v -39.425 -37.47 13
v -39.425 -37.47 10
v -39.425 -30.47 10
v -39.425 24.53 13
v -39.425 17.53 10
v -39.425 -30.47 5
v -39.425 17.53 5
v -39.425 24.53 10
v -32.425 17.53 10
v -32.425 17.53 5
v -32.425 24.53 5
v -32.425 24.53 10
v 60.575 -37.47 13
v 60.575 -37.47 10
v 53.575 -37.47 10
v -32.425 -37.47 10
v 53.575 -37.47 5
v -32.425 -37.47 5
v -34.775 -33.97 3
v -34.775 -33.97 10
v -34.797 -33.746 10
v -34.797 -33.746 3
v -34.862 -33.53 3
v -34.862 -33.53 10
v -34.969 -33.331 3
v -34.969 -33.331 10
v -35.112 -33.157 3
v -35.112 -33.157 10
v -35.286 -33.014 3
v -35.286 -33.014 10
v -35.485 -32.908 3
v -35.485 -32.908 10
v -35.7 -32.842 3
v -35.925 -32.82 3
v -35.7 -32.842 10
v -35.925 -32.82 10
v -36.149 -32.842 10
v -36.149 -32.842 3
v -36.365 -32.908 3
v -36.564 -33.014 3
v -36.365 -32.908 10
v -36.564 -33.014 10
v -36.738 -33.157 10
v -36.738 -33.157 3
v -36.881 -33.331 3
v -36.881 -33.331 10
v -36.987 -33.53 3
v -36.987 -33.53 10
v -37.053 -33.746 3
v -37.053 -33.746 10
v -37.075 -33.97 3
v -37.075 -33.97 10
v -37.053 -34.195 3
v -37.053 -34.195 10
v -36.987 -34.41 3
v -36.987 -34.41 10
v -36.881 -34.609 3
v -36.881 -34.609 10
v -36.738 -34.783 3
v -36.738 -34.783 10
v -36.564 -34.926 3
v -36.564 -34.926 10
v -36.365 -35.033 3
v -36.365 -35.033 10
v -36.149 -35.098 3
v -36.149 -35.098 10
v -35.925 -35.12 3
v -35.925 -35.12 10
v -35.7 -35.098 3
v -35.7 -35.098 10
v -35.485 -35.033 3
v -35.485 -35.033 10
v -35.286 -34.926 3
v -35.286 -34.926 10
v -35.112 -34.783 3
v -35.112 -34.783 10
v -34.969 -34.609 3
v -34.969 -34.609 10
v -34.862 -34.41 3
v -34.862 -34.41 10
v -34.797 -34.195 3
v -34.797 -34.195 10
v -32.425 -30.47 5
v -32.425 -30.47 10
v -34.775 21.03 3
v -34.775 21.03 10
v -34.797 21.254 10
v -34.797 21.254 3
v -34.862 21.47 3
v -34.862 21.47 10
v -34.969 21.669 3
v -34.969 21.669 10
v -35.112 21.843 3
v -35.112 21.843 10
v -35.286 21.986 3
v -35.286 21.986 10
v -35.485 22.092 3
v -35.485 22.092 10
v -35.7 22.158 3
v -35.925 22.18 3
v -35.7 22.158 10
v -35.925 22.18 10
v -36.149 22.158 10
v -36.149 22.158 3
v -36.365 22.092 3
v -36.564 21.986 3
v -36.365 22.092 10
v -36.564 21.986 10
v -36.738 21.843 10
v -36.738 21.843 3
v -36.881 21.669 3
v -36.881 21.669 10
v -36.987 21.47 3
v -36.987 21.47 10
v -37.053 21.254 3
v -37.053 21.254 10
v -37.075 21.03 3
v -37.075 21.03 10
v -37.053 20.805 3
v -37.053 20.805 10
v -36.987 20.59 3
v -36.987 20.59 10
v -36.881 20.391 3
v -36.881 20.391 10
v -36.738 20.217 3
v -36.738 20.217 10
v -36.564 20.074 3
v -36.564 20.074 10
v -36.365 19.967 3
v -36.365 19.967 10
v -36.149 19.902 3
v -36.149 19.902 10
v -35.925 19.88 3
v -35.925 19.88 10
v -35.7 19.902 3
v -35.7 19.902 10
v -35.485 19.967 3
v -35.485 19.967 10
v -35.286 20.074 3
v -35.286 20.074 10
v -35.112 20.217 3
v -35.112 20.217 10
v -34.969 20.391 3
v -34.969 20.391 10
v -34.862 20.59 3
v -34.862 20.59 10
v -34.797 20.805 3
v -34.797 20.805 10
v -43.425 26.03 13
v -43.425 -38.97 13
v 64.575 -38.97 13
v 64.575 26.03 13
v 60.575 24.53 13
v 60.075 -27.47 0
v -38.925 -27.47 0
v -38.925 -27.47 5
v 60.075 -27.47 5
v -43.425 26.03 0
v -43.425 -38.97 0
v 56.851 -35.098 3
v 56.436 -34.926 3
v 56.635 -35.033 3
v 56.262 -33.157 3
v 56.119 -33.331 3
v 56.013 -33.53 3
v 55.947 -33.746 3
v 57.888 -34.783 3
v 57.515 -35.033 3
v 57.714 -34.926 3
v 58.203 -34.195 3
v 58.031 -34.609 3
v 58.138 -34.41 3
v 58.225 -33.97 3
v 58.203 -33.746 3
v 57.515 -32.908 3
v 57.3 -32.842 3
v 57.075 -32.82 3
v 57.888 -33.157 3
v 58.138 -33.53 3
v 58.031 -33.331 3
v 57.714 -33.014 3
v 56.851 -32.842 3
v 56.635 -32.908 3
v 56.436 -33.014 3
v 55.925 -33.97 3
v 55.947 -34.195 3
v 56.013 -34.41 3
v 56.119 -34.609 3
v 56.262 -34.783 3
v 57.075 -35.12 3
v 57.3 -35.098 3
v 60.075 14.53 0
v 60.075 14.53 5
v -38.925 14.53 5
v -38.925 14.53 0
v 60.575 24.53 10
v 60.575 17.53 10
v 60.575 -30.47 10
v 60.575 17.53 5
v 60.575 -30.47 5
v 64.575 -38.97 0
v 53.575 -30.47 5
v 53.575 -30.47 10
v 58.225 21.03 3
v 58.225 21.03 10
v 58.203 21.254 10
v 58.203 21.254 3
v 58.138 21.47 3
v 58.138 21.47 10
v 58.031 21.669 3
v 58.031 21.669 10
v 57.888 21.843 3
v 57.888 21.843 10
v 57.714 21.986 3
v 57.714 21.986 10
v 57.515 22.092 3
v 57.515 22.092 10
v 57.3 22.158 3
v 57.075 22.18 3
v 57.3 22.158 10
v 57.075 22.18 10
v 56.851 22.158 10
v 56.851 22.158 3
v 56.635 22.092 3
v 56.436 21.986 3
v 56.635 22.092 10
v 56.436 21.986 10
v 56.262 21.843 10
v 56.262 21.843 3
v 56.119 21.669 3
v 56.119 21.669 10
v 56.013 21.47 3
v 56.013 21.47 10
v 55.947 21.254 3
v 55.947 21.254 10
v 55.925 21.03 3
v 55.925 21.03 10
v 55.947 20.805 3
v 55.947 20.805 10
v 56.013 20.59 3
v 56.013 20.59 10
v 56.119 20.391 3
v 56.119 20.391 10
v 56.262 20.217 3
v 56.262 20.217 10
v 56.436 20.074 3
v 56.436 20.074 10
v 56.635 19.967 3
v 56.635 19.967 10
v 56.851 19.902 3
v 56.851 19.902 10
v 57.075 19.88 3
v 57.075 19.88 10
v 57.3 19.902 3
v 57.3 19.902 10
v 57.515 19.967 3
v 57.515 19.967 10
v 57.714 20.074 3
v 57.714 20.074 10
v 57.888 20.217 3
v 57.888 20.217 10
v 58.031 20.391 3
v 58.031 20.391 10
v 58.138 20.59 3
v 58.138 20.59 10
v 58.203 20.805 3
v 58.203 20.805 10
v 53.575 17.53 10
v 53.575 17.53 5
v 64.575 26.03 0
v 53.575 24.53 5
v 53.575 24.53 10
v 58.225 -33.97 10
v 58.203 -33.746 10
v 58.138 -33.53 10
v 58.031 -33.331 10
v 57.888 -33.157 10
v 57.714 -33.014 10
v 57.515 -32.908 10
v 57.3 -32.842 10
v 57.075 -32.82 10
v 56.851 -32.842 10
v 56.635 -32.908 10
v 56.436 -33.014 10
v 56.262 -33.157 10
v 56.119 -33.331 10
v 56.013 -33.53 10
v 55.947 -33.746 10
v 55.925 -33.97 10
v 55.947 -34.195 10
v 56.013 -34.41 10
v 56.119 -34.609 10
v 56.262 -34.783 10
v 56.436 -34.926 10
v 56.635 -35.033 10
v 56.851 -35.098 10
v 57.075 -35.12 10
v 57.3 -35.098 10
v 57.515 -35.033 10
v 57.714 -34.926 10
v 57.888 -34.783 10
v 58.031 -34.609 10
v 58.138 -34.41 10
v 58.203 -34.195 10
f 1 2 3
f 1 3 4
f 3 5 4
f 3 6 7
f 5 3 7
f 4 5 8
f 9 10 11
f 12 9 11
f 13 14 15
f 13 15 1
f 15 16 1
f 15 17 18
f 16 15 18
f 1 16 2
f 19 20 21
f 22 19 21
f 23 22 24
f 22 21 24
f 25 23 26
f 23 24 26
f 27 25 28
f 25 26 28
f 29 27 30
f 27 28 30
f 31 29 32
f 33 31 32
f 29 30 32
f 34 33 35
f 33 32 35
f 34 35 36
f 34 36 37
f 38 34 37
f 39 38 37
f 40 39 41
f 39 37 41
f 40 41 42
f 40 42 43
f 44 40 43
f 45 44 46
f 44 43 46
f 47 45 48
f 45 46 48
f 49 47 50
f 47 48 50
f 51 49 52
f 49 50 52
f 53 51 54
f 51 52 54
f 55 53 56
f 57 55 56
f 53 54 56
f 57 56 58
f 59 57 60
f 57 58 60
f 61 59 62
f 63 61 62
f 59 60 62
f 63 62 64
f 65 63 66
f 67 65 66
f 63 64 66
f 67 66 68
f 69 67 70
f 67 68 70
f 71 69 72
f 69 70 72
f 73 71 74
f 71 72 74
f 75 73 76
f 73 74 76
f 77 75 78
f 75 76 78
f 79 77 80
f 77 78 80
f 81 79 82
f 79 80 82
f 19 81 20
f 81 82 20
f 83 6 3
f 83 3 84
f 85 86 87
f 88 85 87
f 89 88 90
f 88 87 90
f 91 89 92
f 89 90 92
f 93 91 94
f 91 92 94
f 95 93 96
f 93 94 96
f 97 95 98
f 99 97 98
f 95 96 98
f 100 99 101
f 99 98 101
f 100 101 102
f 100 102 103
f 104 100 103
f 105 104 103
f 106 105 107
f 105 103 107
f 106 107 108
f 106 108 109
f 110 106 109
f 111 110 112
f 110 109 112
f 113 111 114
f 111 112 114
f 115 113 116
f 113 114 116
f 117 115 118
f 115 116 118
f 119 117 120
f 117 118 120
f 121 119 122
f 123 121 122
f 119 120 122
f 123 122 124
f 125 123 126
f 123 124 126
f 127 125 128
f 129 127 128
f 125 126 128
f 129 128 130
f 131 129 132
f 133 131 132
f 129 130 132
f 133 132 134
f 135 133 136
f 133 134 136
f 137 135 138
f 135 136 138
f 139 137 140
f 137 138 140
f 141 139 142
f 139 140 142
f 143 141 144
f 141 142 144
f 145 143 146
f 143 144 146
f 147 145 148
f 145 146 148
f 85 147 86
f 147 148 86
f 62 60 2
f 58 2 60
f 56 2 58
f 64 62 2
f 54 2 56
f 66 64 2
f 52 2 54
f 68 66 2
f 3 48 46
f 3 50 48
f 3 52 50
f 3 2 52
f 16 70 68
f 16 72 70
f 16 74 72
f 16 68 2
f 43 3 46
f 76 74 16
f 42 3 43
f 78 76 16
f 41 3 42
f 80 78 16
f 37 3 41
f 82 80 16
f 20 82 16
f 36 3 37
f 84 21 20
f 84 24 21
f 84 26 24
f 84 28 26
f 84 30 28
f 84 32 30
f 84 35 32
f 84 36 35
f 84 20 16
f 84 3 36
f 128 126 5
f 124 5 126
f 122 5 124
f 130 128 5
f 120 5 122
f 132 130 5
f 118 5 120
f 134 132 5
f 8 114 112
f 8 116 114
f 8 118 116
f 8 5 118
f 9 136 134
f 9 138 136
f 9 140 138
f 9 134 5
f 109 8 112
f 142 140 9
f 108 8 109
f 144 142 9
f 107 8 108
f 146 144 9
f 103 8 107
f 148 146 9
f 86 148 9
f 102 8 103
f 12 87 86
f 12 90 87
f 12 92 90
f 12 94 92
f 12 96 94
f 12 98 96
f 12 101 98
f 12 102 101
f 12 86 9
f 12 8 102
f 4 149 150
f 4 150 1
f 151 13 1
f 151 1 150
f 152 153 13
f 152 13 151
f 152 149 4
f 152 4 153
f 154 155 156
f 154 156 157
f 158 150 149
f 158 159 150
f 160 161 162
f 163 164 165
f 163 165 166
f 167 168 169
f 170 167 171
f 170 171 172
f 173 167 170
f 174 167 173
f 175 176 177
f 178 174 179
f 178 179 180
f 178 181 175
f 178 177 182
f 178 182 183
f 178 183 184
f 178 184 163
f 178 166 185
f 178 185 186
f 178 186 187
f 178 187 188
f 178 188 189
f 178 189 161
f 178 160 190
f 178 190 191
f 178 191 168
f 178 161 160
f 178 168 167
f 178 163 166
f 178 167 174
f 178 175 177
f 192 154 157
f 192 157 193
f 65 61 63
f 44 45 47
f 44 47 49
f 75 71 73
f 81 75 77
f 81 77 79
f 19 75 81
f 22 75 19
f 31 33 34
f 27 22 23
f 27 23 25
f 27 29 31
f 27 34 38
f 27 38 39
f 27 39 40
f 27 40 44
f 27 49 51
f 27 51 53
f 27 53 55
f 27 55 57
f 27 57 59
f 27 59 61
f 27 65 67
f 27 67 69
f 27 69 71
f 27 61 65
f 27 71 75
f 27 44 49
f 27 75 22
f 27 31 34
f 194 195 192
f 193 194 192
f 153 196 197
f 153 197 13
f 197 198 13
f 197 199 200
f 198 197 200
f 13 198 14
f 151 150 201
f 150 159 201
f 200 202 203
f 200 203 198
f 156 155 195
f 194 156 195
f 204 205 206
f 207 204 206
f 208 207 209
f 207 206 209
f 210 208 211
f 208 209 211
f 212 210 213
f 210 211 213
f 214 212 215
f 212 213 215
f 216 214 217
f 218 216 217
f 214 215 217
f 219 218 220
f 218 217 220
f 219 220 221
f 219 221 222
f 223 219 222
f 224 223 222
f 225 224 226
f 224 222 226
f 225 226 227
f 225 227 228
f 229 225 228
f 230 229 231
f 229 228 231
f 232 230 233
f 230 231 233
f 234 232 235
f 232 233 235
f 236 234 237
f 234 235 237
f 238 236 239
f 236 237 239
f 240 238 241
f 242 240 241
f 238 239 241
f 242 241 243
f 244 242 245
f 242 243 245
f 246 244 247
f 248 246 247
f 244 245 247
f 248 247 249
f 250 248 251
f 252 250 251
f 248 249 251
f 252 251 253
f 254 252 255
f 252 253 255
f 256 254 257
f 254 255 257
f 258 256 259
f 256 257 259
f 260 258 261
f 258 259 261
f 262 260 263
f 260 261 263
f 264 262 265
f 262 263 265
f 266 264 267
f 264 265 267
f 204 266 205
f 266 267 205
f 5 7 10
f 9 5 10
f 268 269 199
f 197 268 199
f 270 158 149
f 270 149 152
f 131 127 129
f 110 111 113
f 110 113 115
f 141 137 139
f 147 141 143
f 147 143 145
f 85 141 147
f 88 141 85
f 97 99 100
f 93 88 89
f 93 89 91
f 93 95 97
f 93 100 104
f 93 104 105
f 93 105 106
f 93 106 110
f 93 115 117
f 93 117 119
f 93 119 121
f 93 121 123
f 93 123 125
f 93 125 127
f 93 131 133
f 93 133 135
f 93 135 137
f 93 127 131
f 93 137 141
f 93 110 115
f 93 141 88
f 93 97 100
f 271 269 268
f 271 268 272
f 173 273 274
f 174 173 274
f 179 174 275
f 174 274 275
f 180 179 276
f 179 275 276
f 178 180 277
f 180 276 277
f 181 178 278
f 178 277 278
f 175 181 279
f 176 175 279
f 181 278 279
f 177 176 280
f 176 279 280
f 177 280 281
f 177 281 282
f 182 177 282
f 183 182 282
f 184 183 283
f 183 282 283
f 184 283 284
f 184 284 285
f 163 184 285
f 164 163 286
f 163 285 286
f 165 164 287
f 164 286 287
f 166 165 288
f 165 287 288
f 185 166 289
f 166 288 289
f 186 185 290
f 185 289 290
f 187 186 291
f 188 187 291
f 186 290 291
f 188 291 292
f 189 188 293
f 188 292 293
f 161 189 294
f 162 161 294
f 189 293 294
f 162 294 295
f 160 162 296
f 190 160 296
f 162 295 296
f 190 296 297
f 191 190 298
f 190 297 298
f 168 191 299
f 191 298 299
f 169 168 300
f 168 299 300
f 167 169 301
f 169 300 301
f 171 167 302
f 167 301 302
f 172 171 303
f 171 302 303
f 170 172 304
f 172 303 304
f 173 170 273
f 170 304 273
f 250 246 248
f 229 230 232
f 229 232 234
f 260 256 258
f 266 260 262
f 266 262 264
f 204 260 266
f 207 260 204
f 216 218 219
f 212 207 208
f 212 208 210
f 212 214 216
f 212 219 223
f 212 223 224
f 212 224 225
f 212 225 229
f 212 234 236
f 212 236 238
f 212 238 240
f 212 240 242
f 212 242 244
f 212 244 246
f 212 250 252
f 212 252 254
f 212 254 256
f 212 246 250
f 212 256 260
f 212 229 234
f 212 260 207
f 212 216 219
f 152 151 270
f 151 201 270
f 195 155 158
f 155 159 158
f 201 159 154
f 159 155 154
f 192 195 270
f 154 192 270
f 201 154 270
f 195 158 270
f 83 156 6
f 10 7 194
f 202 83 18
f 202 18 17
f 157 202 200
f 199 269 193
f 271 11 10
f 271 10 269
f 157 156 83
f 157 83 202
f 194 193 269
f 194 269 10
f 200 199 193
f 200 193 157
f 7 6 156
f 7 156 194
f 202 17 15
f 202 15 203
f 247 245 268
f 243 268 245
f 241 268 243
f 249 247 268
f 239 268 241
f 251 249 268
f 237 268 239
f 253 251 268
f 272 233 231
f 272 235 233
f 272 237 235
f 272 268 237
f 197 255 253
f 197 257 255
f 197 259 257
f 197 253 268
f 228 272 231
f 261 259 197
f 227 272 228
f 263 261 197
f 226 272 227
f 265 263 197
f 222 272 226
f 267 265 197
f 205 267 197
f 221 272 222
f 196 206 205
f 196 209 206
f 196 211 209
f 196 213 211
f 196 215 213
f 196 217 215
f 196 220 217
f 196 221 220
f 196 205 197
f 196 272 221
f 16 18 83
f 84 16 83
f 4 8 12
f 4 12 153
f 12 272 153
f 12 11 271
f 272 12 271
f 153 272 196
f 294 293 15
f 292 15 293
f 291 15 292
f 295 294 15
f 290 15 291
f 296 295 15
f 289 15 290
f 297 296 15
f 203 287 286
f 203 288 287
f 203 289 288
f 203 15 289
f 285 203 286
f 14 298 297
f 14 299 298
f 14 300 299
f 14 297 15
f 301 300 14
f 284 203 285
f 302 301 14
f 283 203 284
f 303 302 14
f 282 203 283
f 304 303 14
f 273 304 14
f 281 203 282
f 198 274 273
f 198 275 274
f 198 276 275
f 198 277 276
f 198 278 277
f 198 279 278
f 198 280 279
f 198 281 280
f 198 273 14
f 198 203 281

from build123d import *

# Parameters (mm, degrees)
SKETCH_1_W          = 108
SKETCH_1_H          = 65
SKETCH_1_W_2        = 99
SKETCH_1_H_2        = 42
EXTRUDE_1_DEPTH     = 5
SKETCH_2_W          = 108
SKETCH_2_H          = 65
SKETCH_2_W_2        = 100
SKETCH_2_H_2        = 62
SKETCH_2_W_3        = 7
SKETCH_2_H_3        = 7
EXTRUDE_2_DEPTH     = 5
SKETCH_3_W          = 108
SKETCH_3_H          = 65
EXTRUDE_4_DEPTH     = 3
SKETCH_4_R          = 1.15
CUT_EXTRUDE_1_DEPTH = 7


with BuildPart() as part:
    # 草圖1 → 填料-伸長1 (new body)
    with BuildSketch(Plane.XY):
        with Locations((10.575206568, -6.470178926)):
            Rectangle(SKETCH_1_W, SKETCH_1_H)
        with Locations((10.575206568, -6.470178926)):
            Rectangle(SKETCH_1_W_2, SKETCH_1_H_2, mode=Mode.SUBTRACT)
    extrude(amount=EXTRUDE_1_DEPTH)

    # 草圖2 → 填料-伸長2 (add)
    # profile 1 of 5: a face of its own
    with BuildSketch(Plane.XY.offset(5)):
        with Locations((10.575206568, -6.470178926)):
            Rectangle(SKETCH_2_W, SKETCH_2_H)
        with Locations((10.575206568, -6.470178926)):
            Rectangle(SKETCH_2_W_2, SKETCH_2_H_2, mode=Mode.SUBTRACT)
    # profile 2 of 5: a face of its own
    with BuildSketch(Plane.XY.offset(5)):
        with Locations((-35.924793432, 21.029821074)):
            Rectangle(SKETCH_2_W_3, SKETCH_2_H_3)
    # profile 3 of 5: a face of its own
    with BuildSketch(Plane.XY.offset(5)):
        with Locations((57.075206568, 21.029821074)):
            Rectangle(SKETCH_2_W_3, SKETCH_2_H_3)
    # profile 4 of 5: a face of its own
    with BuildSketch(Plane.XY.offset(5)):
        with Locations((57.075206568, -33.970178926)):
            Rectangle(SKETCH_2_W_3, SKETCH_2_H_3)
    # profile 5 of 5: a face of its own
    with BuildSketch(Plane.XY.offset(5)):
        with Locations((-35.924793432, -33.970178926)):
            Rectangle(SKETCH_2_W_3, SKETCH_2_H_3)
    extrude(amount=EXTRUDE_2_DEPTH)

    # 草圖3 → 填料-伸長4 (add)
    with BuildSketch(Plane.XY.offset(10)):
        with Locations((10.575206568, -6.470178926)):
            Rectangle(SKETCH_3_W, SKETCH_3_H)
        Polygon((-39.424793432, -37.470178926), (-32.424793432, -37.470178926), (53.575206568, -37.470178926), (60.575206568, -37.470178926), (60.575206568, -30.470178926), (60.575206568, 17.529821074), (60.575206568, 24.529821074), (53.575206568, 24.529821074), (-32.424793432, 24.529821074), (-39.424793432, 24.529821074), (-39.424793432, 17.529821074), (-39.424793432, -30.470178926), align=None, mode=Mode.SUBTRACT)
    extrude(amount=EXTRUDE_4_DEPTH)

    # 草圖4 → 除料-伸長1 (cut)
    with BuildSketch(Plane.XY.offset(10)):
        with Locations((-35.924793432, 21.029821074)):
            Circle(SKETCH_4_R)
        with Locations((57.075206568, 21.029821074)):
            Circle(SKETCH_4_R)
        with Locations((57.075206568, -33.970178926)):
            Circle(SKETCH_4_R)
        with Locations((-35.924793432, -33.970178926)):
            Circle(SKETCH_4_R)
    extrude(amount=-CUT_EXTRUDE_1_DEPTH, mode=Mode.SUBTRACT)


solid = part.part
